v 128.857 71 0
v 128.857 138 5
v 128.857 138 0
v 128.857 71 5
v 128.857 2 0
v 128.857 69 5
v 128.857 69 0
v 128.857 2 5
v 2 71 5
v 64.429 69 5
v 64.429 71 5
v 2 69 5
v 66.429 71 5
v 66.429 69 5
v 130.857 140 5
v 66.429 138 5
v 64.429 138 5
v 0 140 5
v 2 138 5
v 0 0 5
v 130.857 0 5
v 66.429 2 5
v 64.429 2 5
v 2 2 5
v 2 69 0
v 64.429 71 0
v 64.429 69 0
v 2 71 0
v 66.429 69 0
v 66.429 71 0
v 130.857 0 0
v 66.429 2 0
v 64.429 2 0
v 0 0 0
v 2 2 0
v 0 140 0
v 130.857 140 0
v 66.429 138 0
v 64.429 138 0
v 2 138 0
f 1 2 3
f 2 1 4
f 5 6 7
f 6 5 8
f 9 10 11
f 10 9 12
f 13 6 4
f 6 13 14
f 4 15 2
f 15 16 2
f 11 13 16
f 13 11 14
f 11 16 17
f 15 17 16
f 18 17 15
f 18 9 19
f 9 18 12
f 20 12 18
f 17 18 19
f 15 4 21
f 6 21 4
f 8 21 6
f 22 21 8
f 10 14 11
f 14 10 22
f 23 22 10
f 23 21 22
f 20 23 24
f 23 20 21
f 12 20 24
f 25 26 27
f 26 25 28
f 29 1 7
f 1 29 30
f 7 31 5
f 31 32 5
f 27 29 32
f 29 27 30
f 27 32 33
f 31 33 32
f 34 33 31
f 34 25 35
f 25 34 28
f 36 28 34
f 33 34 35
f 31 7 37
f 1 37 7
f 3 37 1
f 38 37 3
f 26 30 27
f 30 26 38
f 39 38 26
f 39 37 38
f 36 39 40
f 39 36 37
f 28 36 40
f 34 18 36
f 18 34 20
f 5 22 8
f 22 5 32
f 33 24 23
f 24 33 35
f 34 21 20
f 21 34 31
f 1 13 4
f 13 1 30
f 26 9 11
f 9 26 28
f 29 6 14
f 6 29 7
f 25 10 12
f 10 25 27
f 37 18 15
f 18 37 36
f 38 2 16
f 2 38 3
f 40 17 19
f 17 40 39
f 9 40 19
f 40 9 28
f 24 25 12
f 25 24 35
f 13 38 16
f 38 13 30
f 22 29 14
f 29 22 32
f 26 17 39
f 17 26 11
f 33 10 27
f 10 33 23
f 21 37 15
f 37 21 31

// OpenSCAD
// file: spice jar sizing.scad
// Common file to keep track of the spice jar we are working with

// Sizes for a single spice jar (mm)
diameter_lid = 63; // mm
diameter_glass = 60; // mm
height_glass = 58; // mm height of the jar part
height_top = 8; //mm Height of the top above the glass
// main file
// Uses rails to hold spice jars in place
$fn=500;

include <spice jar sizing.scad>

// Size of the holder
n_jar_rows = 2;
n_jars_per_row = 2;

// Holder spacing and construction
gap_between_jar_sides = 10/7; // mm - spacing between adjacent jars
gap_jar_height = 1; // mm - extra space in jar hold
jar_holder_height = 5; // mm
width_rail = 2; // mm - How thick the rails should be


// Calculated sizes
jar_height = height_glass + height_top + gap_jar_height;
jar_width = diameter_lid;
row_height = jar_height + width_rail;

col_width = gap_between_jar_sides + jar_width;

length_tray = col_width*n_jars_per_row;
tray_height = jar_holder_height;

// Lay out limit rails
for(i_row = [0:n_jar_rows]) {
    // The rails, one at bottom and one at the top
    translate([0, i_row*row_height, 0])
        cube([length_tray, width_rail, tray_height]);
}

// Supports between rails (which also keep jars from rolling)
for(i_row = [0:n_jar_rows-1]) {
    // Supports between columns
    for(i_col = [0:n_jars_per_row-1]) {
        translate([i_col*col_width, i_row*row_height, 0])
            cube([width_rail, row_height, jar_holder_height]);
    }
    // Last jar support
    translate([n_jars_per_row*col_width, i_row*row_height, 0])
        cube([width_rail, row_height + width_rail, jar_holder_height]);
    
}
